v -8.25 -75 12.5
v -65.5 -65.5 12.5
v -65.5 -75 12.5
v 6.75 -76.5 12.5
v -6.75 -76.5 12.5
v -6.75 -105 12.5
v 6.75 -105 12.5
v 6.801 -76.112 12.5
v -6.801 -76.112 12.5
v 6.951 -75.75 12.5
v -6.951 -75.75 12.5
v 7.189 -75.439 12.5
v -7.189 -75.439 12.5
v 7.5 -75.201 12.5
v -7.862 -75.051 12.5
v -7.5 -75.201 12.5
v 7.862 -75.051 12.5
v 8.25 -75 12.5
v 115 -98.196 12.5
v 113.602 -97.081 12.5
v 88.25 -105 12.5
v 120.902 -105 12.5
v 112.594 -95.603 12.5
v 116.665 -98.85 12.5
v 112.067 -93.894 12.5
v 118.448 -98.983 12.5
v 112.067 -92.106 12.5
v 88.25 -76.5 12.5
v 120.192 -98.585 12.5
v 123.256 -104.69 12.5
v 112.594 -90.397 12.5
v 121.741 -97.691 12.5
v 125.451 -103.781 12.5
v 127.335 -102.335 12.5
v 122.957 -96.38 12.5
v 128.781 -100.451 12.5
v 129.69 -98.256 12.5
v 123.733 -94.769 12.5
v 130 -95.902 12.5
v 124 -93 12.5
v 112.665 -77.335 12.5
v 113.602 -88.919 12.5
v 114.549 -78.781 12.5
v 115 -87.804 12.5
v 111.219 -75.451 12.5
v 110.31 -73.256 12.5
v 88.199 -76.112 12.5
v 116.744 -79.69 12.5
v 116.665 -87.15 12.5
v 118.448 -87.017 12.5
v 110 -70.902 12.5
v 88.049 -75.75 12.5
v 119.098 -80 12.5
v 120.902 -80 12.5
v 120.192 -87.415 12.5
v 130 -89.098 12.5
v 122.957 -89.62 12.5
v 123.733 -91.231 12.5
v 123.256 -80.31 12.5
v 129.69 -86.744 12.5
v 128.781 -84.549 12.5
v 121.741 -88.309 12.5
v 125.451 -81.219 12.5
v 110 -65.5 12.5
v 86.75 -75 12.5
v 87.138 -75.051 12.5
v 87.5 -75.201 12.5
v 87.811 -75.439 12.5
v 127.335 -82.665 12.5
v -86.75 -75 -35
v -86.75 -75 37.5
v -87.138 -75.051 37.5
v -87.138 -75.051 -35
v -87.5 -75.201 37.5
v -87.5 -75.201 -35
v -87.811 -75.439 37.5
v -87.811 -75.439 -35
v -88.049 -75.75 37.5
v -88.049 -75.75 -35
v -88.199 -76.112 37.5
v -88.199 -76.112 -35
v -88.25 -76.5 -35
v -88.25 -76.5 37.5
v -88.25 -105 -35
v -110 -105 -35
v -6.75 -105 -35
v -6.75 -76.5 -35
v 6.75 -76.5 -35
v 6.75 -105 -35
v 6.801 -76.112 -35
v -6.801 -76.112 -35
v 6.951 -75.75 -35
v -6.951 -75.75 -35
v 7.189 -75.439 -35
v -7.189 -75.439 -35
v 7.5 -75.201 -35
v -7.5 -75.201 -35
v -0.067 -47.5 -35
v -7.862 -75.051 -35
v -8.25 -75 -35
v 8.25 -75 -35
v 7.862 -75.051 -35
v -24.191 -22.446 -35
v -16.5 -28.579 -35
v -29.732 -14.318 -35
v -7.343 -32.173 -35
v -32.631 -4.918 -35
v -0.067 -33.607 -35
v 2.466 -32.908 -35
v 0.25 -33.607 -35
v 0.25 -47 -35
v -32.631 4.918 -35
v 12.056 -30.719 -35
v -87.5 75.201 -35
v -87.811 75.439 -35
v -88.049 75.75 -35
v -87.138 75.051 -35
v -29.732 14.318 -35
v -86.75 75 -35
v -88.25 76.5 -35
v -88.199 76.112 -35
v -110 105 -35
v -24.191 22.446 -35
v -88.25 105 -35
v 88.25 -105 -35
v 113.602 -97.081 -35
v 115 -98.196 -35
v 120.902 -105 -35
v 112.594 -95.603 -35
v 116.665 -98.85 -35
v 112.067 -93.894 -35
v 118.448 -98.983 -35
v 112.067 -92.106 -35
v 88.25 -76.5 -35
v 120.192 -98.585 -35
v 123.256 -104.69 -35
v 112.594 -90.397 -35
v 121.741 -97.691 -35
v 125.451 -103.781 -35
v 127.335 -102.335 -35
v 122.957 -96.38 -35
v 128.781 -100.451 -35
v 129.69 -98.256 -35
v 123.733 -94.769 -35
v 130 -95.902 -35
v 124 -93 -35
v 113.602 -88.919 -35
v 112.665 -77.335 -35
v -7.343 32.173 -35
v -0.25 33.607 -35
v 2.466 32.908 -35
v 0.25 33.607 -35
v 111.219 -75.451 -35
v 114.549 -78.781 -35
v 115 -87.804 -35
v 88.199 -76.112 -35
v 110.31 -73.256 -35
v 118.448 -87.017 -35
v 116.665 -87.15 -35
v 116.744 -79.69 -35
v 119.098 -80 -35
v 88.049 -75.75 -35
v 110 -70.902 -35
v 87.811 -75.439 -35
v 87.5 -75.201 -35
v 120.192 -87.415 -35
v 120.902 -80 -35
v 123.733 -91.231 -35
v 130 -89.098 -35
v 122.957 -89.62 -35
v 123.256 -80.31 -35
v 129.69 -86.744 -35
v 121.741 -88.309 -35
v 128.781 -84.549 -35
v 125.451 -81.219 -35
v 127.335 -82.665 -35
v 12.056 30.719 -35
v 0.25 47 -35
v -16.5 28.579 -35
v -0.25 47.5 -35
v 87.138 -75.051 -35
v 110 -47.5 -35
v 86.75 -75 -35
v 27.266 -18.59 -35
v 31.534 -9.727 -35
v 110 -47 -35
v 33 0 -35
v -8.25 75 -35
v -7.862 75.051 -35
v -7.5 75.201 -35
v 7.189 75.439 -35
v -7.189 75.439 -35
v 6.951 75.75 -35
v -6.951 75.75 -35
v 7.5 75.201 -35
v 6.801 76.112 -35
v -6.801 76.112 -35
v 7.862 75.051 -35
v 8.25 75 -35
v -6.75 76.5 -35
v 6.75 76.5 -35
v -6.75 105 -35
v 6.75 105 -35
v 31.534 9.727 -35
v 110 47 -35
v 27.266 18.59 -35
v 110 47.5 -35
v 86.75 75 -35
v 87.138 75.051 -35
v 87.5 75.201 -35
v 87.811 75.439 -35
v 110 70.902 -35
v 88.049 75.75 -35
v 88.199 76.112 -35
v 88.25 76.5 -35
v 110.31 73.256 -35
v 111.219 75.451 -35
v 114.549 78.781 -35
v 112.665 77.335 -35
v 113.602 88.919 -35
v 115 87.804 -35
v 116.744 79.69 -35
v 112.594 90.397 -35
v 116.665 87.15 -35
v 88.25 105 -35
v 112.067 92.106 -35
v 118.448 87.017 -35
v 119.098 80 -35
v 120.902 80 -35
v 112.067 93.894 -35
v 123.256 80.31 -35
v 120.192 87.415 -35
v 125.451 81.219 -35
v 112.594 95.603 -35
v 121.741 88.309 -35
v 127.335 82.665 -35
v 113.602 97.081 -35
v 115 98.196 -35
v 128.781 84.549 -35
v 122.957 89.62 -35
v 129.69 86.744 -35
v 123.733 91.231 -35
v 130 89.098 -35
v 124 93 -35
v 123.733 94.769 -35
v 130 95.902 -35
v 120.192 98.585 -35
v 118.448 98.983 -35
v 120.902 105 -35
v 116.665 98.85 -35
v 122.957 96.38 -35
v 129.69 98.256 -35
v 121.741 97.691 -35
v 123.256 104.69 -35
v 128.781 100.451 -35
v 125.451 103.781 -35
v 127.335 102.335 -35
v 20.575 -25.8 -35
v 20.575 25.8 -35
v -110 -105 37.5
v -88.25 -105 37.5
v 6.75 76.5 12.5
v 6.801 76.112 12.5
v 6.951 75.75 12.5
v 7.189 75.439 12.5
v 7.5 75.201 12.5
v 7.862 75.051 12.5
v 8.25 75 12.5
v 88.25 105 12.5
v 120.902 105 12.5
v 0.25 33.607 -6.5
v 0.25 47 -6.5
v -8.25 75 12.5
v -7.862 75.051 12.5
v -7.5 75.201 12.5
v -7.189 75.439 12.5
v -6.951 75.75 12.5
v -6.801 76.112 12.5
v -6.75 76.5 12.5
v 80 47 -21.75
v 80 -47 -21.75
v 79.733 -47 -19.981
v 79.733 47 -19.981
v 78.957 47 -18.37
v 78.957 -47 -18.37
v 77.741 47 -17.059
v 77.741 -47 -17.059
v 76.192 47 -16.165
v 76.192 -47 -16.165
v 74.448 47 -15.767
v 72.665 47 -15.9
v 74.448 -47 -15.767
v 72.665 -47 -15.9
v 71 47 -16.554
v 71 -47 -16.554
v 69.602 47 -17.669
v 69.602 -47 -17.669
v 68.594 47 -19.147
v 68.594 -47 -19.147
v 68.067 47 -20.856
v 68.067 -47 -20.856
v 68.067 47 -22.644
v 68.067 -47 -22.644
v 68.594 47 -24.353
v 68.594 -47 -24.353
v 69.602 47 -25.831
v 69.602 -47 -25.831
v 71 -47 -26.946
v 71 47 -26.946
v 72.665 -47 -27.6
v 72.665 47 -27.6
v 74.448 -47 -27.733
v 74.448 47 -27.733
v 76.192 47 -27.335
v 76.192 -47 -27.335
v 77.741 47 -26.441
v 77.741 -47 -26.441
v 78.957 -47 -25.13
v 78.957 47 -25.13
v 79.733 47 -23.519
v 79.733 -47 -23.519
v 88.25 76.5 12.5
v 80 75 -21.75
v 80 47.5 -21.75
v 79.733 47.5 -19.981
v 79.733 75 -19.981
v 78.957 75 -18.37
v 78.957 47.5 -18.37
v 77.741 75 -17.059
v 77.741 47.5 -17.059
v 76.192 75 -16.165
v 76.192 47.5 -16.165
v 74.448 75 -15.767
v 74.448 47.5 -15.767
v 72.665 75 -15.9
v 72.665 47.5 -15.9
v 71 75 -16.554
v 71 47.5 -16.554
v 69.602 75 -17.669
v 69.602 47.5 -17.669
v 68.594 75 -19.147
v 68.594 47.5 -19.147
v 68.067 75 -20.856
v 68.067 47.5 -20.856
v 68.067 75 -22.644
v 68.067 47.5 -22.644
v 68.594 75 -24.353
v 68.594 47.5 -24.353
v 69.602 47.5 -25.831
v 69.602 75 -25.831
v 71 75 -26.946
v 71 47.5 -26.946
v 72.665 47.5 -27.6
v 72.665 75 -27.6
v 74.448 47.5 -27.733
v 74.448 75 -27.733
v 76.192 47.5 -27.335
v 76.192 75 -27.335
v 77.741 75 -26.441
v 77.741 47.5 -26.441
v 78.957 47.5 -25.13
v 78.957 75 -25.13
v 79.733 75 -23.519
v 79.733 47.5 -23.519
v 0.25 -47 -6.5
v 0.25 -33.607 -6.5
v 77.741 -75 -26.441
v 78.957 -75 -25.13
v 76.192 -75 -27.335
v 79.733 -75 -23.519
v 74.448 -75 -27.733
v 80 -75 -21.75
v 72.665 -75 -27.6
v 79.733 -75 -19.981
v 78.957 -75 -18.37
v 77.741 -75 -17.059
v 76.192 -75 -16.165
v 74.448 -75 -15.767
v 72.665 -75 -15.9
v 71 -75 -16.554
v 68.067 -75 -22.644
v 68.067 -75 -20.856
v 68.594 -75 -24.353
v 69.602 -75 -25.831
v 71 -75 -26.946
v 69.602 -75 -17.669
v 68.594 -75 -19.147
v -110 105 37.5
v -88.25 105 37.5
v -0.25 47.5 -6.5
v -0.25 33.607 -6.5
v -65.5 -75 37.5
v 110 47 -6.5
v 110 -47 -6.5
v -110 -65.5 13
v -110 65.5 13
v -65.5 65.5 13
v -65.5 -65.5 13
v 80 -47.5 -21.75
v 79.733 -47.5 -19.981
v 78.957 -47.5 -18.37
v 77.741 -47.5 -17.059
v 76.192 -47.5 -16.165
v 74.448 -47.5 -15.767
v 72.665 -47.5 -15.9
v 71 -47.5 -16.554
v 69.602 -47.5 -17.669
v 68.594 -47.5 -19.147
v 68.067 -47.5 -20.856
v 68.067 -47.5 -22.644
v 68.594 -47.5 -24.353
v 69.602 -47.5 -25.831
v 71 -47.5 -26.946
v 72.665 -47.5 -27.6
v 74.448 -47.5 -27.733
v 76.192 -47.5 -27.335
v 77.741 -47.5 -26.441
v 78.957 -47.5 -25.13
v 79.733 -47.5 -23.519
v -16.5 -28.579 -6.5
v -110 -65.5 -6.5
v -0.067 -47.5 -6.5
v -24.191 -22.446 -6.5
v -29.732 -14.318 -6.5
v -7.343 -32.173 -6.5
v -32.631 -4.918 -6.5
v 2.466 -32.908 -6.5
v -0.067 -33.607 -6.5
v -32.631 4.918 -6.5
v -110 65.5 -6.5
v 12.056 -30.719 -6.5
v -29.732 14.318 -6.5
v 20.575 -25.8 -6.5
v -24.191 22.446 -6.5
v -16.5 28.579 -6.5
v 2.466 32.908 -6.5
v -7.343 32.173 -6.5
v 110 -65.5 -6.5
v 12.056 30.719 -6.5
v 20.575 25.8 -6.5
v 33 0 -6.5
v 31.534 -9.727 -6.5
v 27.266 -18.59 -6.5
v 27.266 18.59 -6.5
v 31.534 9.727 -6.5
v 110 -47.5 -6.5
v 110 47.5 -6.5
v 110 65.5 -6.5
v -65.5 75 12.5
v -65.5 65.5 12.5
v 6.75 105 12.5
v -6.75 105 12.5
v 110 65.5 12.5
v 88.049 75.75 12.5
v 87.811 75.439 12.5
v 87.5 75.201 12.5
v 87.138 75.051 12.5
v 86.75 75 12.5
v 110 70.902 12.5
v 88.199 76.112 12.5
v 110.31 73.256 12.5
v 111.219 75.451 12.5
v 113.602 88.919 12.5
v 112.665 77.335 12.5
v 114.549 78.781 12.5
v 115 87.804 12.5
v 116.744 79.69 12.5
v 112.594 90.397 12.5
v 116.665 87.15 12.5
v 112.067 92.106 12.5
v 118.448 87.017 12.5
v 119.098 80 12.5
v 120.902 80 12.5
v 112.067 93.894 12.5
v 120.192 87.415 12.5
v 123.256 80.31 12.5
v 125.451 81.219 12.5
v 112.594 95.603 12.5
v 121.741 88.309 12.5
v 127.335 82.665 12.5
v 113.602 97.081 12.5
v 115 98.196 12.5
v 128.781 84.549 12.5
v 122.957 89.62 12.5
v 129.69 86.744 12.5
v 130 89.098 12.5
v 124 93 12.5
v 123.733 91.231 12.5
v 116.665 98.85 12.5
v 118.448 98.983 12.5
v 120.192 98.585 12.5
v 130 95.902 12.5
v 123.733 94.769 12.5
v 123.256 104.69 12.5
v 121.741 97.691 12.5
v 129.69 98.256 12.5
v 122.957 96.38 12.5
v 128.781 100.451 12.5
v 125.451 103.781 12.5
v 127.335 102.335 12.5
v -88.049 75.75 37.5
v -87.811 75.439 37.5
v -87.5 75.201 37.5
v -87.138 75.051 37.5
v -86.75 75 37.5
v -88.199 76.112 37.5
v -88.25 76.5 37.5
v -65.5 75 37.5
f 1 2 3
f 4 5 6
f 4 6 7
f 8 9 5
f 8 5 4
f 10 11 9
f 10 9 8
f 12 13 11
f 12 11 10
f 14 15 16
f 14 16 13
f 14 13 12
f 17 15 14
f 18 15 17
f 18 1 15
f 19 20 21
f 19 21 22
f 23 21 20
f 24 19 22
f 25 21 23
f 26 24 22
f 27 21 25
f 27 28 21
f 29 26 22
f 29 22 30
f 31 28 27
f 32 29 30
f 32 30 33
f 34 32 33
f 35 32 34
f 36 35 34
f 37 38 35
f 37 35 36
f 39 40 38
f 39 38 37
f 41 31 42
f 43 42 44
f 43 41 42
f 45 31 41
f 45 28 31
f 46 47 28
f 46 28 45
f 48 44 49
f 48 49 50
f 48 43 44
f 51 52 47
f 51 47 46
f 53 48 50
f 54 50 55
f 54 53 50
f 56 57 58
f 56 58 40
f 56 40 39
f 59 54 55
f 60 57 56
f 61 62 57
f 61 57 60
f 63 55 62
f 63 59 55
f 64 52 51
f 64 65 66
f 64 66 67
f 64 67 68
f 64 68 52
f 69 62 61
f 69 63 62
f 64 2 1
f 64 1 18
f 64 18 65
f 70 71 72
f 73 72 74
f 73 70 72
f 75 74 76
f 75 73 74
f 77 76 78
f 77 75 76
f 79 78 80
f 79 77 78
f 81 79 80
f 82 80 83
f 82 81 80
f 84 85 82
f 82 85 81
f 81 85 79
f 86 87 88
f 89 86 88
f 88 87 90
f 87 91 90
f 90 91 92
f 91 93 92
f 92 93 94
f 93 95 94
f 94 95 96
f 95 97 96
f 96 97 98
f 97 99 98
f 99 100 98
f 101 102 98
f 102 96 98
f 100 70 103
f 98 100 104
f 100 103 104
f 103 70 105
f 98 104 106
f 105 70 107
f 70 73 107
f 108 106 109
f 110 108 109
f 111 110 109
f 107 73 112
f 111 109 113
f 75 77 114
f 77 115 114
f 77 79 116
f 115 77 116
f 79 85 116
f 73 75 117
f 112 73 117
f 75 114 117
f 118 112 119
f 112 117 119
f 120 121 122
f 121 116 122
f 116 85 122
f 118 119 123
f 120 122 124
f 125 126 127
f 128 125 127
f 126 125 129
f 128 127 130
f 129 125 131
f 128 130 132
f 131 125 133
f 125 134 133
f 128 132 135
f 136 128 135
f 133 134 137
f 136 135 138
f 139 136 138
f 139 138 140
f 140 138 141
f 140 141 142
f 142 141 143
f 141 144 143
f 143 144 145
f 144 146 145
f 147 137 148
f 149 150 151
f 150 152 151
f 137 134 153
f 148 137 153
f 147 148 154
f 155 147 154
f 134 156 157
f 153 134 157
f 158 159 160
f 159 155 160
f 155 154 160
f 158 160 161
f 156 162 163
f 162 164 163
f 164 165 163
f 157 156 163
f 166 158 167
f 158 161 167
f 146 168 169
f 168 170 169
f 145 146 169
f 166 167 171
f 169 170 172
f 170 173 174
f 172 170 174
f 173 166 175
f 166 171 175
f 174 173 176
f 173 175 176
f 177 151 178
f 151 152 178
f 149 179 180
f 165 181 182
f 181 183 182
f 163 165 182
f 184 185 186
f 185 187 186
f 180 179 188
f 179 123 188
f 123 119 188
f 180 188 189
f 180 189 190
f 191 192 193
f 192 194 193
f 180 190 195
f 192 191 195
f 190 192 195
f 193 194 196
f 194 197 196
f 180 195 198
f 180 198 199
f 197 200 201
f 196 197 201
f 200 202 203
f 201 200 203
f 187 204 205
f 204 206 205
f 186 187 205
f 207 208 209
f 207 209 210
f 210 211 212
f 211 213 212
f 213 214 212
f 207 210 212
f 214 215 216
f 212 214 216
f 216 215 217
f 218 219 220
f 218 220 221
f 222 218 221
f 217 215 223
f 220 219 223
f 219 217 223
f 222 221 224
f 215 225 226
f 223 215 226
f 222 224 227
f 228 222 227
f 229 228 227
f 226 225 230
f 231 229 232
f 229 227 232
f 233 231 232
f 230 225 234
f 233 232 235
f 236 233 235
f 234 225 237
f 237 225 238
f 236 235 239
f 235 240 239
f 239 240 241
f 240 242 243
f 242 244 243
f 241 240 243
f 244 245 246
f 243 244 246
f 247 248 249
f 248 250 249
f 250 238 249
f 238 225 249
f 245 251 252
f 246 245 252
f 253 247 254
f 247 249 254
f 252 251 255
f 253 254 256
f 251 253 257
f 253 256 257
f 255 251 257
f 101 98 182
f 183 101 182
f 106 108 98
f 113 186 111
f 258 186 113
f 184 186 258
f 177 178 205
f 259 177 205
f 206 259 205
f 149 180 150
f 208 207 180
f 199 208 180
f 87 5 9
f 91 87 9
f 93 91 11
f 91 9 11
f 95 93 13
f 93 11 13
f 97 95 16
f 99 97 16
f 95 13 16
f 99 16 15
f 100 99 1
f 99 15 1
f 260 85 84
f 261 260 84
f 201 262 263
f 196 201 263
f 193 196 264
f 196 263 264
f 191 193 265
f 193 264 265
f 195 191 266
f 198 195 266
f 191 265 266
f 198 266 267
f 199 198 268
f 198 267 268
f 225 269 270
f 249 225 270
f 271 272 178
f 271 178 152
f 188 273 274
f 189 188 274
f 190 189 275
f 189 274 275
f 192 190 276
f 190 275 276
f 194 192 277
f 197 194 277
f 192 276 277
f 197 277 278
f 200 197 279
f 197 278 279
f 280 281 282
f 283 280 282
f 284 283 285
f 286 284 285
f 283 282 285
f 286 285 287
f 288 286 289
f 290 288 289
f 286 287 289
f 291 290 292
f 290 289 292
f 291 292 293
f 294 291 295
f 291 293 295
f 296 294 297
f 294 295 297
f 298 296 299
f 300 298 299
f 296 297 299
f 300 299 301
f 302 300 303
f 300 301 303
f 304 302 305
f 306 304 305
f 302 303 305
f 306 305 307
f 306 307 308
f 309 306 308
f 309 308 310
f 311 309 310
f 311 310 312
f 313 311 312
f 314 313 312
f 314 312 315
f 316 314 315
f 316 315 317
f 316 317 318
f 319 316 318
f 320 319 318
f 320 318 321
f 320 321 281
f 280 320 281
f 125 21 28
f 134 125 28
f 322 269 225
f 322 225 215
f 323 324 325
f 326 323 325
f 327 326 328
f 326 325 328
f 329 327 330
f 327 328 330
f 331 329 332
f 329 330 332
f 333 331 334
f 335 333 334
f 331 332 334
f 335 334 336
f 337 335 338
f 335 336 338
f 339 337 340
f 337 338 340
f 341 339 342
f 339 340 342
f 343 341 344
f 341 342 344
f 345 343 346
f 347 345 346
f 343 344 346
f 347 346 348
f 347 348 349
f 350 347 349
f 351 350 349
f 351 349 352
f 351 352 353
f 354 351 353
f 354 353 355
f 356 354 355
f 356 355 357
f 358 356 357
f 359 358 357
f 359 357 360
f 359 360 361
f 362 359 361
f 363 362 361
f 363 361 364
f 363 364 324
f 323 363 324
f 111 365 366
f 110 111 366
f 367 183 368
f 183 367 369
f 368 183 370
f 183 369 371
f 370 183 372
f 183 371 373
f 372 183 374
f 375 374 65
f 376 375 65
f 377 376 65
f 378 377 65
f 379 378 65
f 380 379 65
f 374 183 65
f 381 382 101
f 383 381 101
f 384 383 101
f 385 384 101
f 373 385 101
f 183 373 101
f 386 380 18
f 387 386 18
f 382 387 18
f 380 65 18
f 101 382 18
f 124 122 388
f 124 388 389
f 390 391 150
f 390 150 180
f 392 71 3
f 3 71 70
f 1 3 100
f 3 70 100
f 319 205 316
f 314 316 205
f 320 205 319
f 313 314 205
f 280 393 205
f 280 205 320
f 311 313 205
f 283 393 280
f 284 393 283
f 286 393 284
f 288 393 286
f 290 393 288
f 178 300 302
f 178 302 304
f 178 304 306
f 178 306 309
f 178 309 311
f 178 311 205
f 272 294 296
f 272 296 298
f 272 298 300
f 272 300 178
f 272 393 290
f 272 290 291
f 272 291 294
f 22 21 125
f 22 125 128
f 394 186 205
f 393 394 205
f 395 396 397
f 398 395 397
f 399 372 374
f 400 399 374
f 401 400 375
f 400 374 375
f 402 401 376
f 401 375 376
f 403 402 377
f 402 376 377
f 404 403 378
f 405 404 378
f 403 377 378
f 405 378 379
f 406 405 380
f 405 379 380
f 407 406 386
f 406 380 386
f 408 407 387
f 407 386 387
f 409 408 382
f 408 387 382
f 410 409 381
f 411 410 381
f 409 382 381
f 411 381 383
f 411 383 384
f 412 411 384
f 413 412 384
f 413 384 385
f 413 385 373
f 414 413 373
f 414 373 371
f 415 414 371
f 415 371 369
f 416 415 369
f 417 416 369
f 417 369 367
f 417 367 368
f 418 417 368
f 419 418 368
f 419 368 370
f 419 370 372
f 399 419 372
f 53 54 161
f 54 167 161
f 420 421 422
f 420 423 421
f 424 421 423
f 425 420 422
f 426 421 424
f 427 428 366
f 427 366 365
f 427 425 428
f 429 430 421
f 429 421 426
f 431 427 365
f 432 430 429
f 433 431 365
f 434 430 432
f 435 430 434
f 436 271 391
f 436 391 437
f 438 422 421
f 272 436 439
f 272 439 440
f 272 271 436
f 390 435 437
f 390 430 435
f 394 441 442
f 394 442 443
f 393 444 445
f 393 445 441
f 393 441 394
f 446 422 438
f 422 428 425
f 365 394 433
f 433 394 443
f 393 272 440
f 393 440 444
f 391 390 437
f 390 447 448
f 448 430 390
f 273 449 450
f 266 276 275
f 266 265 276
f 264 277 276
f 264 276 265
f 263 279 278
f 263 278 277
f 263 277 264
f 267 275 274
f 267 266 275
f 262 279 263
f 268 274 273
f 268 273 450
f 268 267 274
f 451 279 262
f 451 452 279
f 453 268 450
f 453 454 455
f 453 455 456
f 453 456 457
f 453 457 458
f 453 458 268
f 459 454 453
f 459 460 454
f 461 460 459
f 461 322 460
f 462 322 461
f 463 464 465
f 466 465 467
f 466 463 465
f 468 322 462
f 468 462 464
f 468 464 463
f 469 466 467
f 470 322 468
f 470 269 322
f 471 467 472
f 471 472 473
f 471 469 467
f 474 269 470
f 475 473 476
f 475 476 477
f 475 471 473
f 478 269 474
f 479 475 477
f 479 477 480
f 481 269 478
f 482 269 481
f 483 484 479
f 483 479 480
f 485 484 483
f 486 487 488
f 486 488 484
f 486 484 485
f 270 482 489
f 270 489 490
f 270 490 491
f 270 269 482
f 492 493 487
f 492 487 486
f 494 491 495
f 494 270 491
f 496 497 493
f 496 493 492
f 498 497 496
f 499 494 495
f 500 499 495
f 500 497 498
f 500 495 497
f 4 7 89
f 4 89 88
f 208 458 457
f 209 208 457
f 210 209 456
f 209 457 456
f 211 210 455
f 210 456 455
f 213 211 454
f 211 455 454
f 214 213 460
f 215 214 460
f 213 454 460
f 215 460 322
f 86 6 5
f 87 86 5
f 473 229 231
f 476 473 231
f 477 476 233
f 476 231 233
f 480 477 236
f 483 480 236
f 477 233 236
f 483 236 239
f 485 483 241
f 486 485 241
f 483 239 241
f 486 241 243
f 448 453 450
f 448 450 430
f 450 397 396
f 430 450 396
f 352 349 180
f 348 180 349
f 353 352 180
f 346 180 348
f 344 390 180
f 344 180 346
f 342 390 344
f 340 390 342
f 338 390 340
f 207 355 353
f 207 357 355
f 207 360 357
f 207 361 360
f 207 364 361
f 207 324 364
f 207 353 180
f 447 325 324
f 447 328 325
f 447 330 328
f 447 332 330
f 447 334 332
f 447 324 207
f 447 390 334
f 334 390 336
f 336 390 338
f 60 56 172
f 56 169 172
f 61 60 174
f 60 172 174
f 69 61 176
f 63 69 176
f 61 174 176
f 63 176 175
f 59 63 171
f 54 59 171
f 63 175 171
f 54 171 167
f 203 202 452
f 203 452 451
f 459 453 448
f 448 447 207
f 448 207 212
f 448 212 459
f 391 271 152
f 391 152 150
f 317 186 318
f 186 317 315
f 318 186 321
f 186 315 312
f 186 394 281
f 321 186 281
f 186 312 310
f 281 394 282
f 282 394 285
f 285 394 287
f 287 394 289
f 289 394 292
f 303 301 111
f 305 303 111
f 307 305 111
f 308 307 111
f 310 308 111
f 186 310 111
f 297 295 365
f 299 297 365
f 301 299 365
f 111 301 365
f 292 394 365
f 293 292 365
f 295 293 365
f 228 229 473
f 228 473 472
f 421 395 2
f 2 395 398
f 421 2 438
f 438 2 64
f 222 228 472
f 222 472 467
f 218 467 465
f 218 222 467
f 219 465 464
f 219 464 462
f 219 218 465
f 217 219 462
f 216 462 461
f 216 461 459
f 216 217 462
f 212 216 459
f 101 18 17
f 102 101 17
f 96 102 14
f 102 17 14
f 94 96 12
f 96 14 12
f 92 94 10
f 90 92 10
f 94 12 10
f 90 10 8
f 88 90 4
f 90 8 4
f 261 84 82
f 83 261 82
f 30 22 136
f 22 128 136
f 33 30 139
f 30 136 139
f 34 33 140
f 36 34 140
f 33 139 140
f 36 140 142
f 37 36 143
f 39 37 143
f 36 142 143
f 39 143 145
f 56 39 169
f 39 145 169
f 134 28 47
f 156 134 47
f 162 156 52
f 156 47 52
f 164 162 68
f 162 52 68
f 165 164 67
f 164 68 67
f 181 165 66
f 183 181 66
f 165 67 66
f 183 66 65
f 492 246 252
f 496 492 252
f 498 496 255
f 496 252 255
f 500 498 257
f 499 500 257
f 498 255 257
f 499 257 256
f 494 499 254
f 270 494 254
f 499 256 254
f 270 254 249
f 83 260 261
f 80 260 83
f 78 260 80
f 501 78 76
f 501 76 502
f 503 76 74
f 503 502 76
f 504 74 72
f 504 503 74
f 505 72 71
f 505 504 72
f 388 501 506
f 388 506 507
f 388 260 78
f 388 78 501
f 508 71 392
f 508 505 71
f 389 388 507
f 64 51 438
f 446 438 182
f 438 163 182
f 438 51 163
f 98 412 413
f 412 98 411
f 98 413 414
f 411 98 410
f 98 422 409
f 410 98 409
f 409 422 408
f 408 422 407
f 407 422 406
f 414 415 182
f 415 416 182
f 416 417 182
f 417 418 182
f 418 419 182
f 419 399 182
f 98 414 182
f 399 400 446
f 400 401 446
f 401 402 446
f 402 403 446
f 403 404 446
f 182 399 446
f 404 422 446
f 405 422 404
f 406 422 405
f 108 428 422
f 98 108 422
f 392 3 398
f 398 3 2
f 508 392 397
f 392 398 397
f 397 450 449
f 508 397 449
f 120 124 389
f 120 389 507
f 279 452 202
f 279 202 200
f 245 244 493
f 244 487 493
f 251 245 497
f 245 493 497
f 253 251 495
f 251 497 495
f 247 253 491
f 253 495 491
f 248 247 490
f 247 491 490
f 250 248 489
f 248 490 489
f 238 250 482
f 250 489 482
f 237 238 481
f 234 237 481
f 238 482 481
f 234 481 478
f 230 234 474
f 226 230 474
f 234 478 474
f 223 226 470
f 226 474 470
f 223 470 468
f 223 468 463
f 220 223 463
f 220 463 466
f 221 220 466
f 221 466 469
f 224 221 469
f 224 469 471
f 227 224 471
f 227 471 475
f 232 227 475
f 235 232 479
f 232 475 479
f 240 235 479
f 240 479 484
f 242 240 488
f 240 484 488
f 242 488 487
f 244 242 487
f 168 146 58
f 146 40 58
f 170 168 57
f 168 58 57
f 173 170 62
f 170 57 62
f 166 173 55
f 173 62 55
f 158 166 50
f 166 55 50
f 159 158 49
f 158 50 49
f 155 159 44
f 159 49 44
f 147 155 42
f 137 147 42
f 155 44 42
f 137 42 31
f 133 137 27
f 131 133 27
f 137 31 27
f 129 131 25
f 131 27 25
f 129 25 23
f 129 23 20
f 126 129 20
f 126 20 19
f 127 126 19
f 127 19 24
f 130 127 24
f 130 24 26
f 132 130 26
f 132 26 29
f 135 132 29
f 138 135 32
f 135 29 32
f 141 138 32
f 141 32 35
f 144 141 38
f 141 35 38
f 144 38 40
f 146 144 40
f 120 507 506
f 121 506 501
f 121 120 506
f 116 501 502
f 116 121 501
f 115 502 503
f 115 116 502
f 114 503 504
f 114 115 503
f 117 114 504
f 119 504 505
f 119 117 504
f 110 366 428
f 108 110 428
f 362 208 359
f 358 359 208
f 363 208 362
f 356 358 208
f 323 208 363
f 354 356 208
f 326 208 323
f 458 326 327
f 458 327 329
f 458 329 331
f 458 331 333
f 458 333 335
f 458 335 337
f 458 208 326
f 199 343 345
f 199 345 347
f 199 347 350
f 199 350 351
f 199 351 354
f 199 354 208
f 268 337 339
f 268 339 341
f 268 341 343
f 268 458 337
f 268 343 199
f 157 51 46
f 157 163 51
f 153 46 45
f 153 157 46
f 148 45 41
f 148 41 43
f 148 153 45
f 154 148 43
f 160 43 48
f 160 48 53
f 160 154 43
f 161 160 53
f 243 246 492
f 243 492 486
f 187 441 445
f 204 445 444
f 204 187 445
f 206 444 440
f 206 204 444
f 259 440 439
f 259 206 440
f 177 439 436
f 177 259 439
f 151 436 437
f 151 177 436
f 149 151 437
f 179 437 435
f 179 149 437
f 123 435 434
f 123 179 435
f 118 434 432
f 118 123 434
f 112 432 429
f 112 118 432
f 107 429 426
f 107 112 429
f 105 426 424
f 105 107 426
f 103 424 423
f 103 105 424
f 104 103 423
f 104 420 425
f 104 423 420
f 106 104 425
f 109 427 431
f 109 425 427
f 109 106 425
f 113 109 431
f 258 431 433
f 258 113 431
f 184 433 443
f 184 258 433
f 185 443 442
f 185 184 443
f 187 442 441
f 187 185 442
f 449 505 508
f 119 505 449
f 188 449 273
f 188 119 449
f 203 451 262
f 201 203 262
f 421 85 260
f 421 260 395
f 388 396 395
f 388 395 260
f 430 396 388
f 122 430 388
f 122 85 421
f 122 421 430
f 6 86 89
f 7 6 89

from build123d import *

# Parameters (mm, degrees)
SKETCH021_R          = 33
PAD012_DEPTH         = 35
PAD012_DEPTH_BACK    = 12.5
PAD013_START         = 12.5
SKETCH022_W          = 44.5
SKETCH022_H          = 210
PAD013_DEPTH         = 25
POCKET005_DEPTH      = 6.5
POCKET005_DEPTH_BACK = 13
SKETCH_2_R           = 6
POCKET006_DEPTH      = 50
POCKET006_DEPTH_BACK = 50
SKETCH028_R          = 6
POCKET011_DEPTH      = 180.001


with BuildPart() as part:
    # Sketch021 → Pad012 (new body, two sides)
    with BuildSketch(Plane.XY) as pad012_sk:
        with BuildLine():
            Line((-110, -105), (110, -105))
            Line((110, -105), (120.90162, -105))
            ThreePointArc((120.90162, -105), (127.335146, -102.335146), (130, -95.90162))
            Line((130, -95.90162), (130, -89.09838))
            ThreePointArc((130, -89.09838), (127.335146, -82.664854), (120.90162, -80))
            Line((120.90162, -80), (119.09838, -80))
            ThreePointArc((110, -70.90162), (112.664854, -77.335146), (119.09838, -80))
            Line((110, -70.90162), (110, 0))
            Line((110, 70.90162), (110, 0))
            ThreePointArc((119.09838, 80), (112.664854, 77.335146), (110, 70.90162))
            Line((120.90162, 80), (119.09838, 80))
            ThreePointArc((120.90162, 80), (127.335146, 82.664854), (130, 89.09838))
            Line((130, 95.90162), (130, 89.09838))
            ThreePointArc((130, 95.90162), (127.335146, 102.335146), (120.90162, 105))
            Line((110, 105), (120.90162, 105))
            Line((110, 105), (-110, 105))
            Line((-110, 105), (-110, 0))
            Line((-110, -105), (-110, 0))
        make_face()
        Circle(SKETCH021_R, mode=Mode.SUBTRACT)
    extrude(amount=-PAD012_DEPTH)
    extrude(pad012_sk.sketch, amount=PAD012_DEPTH_BACK)

    # Sketch022 → Pad013 (join)
    with BuildSketch(Plane.XY.offset(PAD013_START)):
        with Locations((-87.75, 0)):
            Rectangle(SKETCH022_W, SKETCH022_H)
    extrude(amount=PAD013_DEPTH)

    # Sketch_1 → Pocket005 (cut, two sides)
    with BuildSketch(Plane.XY) as pocket005_sk:
        Polygon((145.597992, 65.5), (0, 65.5), (-153.015656, 65.5), (-153.015656, -65.5), (0, -65.5), (145.597992, -65.5), align=None)
    extrude(amount=-POCKET005_DEPTH, mode=Mode.SUBTRACT)
    extrude(pocket005_sk.sketch, amount=POCKET005_DEPTH_BACK, mode=Mode.SUBTRACT)

    # Sketch_2 → Pocket006 (cut, two sides)
    with BuildSketch(Plane.XY) as pocket006_sk:
        with Locations((-118, 93)):
            Circle(SKETCH_2_R)
        with Locations((118, 93)):
            Circle(SKETCH_2_R)
        with Locations((-118, -93)):
            Circle(SKETCH_2_R)
        with Locations((118, -93)):
            Circle(SKETCH_2_R)
        Polygon((-0.25, 33.607407), (-0.25, 47.5), (126.736248, 47.5), (126.736248, 47), (0.25, 47), (0.25, 33.607407), align=None)
        with BuildLine():
            ThreePointArc((86.75, 75), (87.81066, 75.43934), (88.25, 76.5))
            Line((88.25, 105), (88.25, 76.5))
            Line((88.25, 105), (6.75, 105))
            Line((6.75, 105), (6.75, 76.5))
            ThreePointArc((6.75, 76.5), (7.18934, 75.43934), (8.25, 75))
            Line((86.75, 75), (8.25, 75))
        make_face()
        Polygon((-0.067348, -33.607407), (-0.067348, -47.5), (126.736248, -47.5), (126.736248, -47), (0.25, -47), (0.25, -33.607407), align=None)
        with BuildLine():
            ThreePointArc((-88.25, 76.5), (-87.81066, 75.43934), (-86.75, 75))
            Line((-86.75, 75), (-8.25, 75))
            ThreePointArc((-8.25, 75), (-7.18934, 75.43934), (-6.75, 76.5))
            Line((-6.75, 105), (-6.75, 76.5))
            Line((-88.25, 105), (-6.75, 105))
            Line((-88.25, 105), (-88.25, 76.5))
        make_face()
        with BuildLine():
            ThreePointArc((88.25, -76.5), (87.81066, -75.43934), (86.75, -75))
            Line((86.75, -75), (8.25, -75))
            ThreePointArc((8.25, -75), (7.18934, -75.43934), (6.75, -76.5))
            Line((6.75, -105), (6.75, -76.5))
            Line((88.25, -105), (6.75, -105))
            Line((88.25, -105), (88.25, -76.5))
        make_face()
        with BuildLine():
            ThreePointArc((-86.75, -75), (-87.81066, -75.43934), (-88.25, -76.5))
            Line((-88.25, -105), (-88.25, -76.5))
            Line((-88.25, -105), (-6.75, -105))
            Line((-6.75, -105), (-6.75, -76.5))
            ThreePointArc((-6.75, -76.5), (-7.18934, -75.43934), (-8.25, -75))
            Line((-86.75, -75), (-8.25, -75))
        make_face()
    extrude(amount=-POCKET006_DEPTH, mode=Mode.SUBTRACT)
    extrude(pocket006_sk.sketch, amount=POCKET006_DEPTH_BACK, mode=Mode.SUBTRACT)

    # Sketch028 → Pocket011 (cut, through all)
    with BuildSketch(Plane.XZ.offset(75)):
        with Locations((74, -21.75)):
            Circle(SKETCH028_R)
    extrude(amount=-POCKET011_DEPTH, mode=Mode.SUBTRACT)


solid = part.part
